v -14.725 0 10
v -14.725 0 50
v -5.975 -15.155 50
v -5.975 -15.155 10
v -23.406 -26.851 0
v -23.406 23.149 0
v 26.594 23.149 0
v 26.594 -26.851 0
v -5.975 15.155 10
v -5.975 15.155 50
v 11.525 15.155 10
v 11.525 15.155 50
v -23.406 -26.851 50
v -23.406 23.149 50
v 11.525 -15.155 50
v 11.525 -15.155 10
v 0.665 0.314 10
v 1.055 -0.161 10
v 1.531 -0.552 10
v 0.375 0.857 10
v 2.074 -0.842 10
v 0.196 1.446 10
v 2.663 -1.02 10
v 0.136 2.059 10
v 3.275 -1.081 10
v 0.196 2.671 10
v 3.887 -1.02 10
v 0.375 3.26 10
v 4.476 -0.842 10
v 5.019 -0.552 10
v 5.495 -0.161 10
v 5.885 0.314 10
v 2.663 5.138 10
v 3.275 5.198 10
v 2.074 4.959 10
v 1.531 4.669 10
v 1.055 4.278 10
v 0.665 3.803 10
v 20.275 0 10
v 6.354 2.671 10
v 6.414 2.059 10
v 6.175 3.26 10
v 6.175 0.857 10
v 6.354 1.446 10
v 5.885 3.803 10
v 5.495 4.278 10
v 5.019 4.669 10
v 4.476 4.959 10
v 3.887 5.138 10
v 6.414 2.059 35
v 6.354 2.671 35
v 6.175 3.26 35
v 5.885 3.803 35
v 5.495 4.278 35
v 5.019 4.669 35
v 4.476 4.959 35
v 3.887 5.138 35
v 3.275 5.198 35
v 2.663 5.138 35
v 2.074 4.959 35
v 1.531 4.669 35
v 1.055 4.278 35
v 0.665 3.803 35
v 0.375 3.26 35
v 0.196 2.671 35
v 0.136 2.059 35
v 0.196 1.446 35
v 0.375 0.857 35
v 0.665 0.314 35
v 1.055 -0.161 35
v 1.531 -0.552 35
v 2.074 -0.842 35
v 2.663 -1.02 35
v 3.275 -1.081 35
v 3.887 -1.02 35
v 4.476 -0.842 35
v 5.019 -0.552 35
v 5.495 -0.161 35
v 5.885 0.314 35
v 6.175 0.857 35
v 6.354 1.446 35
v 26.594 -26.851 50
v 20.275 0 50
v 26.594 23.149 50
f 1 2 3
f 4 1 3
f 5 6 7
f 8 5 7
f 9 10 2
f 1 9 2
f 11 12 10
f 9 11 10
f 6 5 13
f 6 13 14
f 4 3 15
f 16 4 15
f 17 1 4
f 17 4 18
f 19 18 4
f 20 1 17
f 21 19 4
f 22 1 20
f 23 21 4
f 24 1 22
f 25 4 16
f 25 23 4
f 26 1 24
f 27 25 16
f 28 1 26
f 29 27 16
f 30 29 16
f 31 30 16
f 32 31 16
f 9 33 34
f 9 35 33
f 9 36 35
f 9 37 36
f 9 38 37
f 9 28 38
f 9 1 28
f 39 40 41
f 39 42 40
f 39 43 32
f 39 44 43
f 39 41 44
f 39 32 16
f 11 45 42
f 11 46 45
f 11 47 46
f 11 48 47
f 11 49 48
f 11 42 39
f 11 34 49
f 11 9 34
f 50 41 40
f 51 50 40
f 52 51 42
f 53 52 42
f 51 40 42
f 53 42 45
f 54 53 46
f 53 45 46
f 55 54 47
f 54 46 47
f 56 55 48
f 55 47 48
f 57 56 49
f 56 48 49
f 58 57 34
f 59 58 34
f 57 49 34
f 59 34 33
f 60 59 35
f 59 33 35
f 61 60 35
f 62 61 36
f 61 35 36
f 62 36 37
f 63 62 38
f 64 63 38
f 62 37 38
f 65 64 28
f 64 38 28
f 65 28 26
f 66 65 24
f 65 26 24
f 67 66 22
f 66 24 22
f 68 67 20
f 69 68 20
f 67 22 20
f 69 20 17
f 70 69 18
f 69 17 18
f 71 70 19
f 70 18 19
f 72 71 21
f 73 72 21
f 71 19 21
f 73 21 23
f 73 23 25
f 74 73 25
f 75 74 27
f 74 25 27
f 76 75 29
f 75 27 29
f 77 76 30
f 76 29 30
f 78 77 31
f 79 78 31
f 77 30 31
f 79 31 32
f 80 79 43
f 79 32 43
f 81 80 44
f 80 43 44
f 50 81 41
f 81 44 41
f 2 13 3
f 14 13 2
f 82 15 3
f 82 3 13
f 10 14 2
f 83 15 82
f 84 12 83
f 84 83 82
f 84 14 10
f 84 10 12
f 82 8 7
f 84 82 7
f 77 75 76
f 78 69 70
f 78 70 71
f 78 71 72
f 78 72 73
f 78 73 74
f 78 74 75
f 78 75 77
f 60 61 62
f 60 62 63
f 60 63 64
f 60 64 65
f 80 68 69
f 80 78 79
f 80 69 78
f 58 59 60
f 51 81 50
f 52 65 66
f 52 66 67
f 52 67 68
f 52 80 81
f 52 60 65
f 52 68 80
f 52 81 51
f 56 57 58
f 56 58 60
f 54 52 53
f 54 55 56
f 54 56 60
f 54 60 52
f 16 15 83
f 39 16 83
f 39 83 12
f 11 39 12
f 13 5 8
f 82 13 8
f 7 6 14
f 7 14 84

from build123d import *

# Parameters (mm, degrees)
F0_W     = 50
F0_H     = 50
F1_DEPTH = 50
F3_DEPTH = 40
F4_R     = 3.139309
F5_DEPTH = 25


with BuildPart() as f1:
    # F0 (on Top) → F1 (new body)
    with BuildSketch(Plane.XY):
        with Locations((1.594128, -1.850611)):
            Rectangle(F0_W, F0_H)
    extrude(amount=F1_DEPTH)

    # F2 (on face) → F3 (cut)
    with BuildSketch(Plane.XY.offset(50)):
        Polygon((-5.974522, -15.155445), (11.525478, -15.155445), (20.275478, 0), (11.525478, 15.155445), (-5.974522, 15.155445), (-14.724522, 0), align=None)
    extrude(amount=-F3_DEPTH, mode=Mode.SUBTRACT)

    # F4 (on face) → F5 (join)
    with BuildSketch(Plane.XY.offset(10)):
        with Locations((3.275001, 2.058548)):
            Circle(F4_R)
    extrude(amount=F5_DEPTH)


solid = f1.part
